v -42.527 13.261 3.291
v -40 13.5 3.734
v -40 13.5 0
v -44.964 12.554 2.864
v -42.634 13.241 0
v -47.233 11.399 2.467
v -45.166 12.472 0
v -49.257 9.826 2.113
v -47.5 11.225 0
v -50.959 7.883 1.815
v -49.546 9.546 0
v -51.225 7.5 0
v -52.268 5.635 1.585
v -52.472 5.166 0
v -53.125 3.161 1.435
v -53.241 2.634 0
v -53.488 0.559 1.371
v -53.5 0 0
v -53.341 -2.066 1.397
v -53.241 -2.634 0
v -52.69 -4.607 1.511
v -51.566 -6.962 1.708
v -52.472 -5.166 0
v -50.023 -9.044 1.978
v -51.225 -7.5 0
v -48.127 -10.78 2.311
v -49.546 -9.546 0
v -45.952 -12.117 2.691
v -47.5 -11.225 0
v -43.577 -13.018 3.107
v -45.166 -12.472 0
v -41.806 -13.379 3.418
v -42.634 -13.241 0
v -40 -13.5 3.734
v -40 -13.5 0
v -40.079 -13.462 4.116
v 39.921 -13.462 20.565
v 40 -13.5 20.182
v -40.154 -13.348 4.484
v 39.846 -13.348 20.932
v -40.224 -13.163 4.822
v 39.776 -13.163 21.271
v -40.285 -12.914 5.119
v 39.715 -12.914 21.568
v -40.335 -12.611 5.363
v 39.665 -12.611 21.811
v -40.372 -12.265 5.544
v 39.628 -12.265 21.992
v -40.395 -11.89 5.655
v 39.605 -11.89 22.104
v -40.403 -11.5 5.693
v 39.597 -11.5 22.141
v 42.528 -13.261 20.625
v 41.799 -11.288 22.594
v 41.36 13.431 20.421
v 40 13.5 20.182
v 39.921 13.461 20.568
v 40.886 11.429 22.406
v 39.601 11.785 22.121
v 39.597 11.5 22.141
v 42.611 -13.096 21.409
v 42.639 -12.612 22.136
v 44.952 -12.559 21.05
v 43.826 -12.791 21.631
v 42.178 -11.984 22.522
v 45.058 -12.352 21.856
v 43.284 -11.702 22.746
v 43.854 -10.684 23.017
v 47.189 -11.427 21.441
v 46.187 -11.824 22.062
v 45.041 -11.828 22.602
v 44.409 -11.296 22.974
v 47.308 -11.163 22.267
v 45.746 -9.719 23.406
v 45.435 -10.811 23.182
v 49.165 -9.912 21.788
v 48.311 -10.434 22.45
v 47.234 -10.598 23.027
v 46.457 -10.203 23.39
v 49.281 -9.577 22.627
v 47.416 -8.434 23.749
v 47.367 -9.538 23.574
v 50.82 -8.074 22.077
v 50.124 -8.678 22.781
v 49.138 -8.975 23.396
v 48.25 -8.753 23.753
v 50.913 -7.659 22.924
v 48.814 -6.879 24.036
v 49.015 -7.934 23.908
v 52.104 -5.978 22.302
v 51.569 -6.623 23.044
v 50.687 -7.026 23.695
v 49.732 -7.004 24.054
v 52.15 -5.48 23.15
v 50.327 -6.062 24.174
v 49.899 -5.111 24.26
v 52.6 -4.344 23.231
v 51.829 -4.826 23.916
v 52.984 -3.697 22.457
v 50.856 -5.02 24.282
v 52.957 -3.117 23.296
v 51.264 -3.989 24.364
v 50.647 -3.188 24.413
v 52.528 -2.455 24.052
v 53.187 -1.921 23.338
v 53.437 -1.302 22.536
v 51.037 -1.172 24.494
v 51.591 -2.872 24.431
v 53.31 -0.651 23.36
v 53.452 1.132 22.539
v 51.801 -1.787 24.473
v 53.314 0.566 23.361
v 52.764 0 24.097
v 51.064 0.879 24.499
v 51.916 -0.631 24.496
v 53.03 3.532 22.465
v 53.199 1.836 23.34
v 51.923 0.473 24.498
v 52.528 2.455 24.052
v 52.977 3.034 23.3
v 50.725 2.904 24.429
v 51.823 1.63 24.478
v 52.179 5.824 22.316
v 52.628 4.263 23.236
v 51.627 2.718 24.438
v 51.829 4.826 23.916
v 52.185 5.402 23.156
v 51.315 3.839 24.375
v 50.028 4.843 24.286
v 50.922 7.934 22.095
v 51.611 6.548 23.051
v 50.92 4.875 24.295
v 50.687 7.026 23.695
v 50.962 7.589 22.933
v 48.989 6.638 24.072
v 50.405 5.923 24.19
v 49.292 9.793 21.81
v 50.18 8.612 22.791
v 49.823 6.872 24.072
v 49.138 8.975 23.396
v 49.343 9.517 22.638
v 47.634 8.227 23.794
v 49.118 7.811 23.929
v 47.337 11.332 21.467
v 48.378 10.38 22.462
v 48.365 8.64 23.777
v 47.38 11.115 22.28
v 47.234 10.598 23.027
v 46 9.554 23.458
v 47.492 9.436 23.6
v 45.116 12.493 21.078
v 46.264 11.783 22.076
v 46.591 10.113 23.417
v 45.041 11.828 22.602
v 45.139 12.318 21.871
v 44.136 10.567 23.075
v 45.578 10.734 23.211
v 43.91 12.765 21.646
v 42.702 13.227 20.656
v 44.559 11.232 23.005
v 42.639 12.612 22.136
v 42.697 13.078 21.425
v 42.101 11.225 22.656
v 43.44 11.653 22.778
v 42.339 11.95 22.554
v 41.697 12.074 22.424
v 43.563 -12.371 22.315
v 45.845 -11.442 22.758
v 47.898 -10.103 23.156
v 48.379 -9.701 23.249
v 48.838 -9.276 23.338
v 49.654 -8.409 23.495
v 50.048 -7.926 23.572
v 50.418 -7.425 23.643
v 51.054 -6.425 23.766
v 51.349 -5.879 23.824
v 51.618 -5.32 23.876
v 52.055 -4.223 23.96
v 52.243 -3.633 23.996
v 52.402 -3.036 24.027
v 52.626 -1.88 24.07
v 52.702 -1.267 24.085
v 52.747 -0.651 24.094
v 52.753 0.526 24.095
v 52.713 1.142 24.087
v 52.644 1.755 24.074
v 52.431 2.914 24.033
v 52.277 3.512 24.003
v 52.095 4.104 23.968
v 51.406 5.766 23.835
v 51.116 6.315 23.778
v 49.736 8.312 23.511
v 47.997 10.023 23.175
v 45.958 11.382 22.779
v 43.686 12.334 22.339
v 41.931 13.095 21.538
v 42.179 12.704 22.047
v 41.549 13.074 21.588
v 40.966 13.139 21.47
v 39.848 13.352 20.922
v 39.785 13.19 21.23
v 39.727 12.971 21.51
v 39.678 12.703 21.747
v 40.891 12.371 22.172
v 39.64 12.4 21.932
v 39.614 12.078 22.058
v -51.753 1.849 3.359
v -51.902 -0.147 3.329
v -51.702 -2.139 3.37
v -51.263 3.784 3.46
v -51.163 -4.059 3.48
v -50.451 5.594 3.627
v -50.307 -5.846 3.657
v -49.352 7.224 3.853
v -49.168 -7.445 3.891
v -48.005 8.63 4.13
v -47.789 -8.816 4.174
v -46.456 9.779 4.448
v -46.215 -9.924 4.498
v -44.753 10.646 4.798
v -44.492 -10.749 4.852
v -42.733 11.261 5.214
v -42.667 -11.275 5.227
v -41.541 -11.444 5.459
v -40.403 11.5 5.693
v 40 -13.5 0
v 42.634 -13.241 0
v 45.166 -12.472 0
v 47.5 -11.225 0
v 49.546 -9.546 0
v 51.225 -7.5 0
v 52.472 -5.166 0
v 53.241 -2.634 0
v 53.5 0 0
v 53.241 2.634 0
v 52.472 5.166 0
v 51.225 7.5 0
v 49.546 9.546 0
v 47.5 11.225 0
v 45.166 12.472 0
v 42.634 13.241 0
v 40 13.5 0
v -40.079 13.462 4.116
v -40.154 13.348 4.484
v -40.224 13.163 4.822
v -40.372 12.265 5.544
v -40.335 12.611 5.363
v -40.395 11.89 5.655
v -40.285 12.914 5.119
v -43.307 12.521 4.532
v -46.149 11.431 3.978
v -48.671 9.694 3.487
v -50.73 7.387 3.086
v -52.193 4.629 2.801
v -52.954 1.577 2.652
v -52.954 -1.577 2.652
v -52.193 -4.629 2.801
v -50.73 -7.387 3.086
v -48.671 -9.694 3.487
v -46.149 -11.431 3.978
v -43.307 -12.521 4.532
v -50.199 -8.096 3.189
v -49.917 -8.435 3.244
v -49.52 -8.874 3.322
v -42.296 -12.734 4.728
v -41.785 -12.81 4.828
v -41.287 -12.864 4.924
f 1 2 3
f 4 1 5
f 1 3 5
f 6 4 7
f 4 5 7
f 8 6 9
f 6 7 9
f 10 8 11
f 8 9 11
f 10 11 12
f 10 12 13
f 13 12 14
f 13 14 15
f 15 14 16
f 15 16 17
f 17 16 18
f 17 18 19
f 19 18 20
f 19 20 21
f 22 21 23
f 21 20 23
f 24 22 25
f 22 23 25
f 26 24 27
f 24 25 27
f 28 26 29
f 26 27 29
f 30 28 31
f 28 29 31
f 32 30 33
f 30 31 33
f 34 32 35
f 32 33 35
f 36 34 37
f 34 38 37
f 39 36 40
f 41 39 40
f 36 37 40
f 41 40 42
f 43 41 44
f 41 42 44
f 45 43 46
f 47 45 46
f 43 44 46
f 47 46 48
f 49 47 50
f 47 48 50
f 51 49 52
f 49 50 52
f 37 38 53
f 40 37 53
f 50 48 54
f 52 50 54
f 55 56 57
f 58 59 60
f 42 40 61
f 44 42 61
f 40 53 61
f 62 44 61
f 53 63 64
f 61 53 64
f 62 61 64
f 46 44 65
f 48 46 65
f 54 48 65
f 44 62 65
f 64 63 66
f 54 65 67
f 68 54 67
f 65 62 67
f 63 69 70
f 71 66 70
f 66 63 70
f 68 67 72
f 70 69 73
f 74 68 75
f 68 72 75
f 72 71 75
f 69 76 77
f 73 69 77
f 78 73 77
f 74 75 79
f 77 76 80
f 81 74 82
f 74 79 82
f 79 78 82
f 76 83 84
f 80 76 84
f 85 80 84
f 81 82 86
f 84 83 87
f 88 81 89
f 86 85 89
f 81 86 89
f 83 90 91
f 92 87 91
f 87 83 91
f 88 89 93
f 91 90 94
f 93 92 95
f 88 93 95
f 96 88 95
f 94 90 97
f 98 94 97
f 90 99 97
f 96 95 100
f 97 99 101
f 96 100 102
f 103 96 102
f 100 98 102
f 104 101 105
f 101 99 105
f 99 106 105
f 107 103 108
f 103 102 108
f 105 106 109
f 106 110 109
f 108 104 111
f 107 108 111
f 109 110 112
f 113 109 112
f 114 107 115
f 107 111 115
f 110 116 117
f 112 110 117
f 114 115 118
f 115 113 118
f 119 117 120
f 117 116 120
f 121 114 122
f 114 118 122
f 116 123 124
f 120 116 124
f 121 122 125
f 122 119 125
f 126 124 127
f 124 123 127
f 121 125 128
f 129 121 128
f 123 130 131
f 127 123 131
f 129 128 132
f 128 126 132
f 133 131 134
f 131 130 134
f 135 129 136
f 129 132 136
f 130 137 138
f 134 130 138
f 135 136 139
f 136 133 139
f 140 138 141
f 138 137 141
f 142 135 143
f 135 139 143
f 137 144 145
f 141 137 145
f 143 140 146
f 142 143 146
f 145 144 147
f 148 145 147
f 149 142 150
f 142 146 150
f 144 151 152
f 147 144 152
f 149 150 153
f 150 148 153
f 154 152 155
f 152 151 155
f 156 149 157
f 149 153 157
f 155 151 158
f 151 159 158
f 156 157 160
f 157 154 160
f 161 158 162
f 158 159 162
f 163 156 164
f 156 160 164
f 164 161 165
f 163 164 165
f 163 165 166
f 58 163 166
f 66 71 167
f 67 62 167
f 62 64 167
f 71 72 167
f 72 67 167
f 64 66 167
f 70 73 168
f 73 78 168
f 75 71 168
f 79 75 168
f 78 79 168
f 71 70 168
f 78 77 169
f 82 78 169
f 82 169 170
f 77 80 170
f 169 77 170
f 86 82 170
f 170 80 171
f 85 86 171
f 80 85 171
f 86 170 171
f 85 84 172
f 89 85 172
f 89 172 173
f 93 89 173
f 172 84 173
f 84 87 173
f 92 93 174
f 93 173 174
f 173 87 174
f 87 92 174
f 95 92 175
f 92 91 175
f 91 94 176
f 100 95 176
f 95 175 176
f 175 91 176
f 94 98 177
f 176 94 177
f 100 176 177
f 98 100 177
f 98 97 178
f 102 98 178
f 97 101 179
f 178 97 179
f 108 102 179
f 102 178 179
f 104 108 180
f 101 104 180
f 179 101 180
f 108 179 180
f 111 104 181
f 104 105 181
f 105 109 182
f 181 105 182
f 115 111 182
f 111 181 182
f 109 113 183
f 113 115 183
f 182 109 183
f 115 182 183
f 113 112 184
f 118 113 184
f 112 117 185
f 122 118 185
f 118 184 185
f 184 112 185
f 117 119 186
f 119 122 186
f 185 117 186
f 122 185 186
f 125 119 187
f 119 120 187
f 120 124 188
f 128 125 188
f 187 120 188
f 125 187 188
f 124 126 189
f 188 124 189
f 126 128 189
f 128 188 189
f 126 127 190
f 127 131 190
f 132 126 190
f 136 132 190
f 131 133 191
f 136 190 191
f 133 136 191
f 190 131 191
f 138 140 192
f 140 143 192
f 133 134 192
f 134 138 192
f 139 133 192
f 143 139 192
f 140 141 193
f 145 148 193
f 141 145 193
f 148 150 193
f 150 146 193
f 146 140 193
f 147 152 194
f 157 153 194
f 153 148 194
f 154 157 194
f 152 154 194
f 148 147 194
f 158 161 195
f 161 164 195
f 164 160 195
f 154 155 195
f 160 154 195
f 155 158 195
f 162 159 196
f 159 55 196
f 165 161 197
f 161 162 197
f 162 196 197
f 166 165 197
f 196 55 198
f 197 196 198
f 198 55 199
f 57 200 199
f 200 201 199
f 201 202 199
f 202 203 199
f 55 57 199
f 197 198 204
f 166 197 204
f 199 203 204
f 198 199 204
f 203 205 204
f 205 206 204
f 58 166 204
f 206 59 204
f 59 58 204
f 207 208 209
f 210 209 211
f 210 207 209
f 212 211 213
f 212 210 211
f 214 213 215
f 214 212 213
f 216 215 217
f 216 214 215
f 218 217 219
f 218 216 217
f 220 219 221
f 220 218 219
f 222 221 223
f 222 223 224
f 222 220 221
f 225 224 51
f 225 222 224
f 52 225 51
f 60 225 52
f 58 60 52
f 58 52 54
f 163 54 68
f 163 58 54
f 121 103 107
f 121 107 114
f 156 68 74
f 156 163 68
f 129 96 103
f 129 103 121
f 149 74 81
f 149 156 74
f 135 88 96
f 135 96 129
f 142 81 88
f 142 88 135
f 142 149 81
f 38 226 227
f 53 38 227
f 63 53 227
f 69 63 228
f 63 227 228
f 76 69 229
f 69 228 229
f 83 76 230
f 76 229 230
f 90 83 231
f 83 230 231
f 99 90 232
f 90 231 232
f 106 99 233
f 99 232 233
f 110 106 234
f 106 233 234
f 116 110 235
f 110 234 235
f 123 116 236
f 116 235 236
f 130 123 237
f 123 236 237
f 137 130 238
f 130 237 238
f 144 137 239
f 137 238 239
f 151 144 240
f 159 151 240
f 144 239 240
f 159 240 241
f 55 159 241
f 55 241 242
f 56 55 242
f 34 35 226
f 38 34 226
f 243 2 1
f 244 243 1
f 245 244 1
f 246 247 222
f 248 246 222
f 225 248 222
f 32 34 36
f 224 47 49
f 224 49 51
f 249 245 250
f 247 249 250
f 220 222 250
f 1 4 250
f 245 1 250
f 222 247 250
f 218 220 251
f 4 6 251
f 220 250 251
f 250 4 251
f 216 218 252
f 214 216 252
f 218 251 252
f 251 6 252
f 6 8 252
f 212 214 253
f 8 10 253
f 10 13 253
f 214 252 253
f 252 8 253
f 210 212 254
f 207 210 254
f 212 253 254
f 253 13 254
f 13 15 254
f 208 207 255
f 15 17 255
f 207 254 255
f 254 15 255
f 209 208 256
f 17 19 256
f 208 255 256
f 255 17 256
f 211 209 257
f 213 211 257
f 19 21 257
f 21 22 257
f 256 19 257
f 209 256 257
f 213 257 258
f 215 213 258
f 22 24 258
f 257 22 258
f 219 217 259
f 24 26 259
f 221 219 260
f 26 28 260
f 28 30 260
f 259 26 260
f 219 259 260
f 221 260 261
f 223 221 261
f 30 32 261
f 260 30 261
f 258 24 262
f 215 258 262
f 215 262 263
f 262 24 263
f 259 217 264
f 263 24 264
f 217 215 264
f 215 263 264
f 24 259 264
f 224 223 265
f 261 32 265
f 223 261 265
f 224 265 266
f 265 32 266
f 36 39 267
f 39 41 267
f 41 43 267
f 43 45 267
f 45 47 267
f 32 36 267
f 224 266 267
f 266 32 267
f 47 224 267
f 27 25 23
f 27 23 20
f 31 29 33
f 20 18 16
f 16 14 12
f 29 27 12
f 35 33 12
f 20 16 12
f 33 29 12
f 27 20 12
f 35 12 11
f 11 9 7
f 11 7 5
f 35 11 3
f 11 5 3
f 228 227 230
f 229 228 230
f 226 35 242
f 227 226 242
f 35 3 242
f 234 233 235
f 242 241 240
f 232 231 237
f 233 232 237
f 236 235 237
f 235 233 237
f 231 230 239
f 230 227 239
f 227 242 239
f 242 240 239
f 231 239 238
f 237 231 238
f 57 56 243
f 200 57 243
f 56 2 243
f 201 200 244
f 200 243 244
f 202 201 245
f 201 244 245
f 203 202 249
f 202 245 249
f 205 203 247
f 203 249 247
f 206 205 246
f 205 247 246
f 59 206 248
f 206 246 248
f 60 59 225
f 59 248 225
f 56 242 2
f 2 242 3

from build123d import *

# Parameters (mm, degrees)
F1_DEPTH      = 25
F3_DEPTH      = 25
F3_DEPTH_BACK = 25
F4_R          = 2


with BuildPart() as f1:
    # F0 (on Top) → F1 (new body)
    with BuildSketch(Plane.XY):
        with BuildLine():
            ThreePointArc((-40, 13.5), (-53.5, 0), (-40, -13.5))
            Line((-40, -13.5), (40, -13.5))
            ThreePointArc((40, -13.5), (53.5, 0), (40, 13.5))
            Line((40, 13.5), (-40, 13.5))
        make_face()
    extrude(amount=F1_DEPTH)

    # F2 (on Front) → F3 (cut, two sides)
    with BuildSketch(Plane.XZ) as f3_sk:
        Polygon((-53.5, 25), (-53.5, 3), (53.5, 25), align=None)
    extrude(amount=-F3_DEPTH, mode=Mode.SUBTRACT)
    extrude(f3_sk.sketch, amount=F3_DEPTH_BACK, mode=Mode.SUBTRACT)

    # F4
    f4_edges = [f1.edges().sort_by_distance(p)[0] for p in [
        (-49.496415, -9.595212, 3.823167),
        (0, -13.5, 14),
        (49.496415, -9.595212, 24.176833),
        (49.496415, 9.595212, 24.176833),
        (0, 13.5, 14),
        (-49.496415, 9.595212, 3.823167),
    ]]
    fillet(f4_edges, radius=F4_R)


solid = f1.part
